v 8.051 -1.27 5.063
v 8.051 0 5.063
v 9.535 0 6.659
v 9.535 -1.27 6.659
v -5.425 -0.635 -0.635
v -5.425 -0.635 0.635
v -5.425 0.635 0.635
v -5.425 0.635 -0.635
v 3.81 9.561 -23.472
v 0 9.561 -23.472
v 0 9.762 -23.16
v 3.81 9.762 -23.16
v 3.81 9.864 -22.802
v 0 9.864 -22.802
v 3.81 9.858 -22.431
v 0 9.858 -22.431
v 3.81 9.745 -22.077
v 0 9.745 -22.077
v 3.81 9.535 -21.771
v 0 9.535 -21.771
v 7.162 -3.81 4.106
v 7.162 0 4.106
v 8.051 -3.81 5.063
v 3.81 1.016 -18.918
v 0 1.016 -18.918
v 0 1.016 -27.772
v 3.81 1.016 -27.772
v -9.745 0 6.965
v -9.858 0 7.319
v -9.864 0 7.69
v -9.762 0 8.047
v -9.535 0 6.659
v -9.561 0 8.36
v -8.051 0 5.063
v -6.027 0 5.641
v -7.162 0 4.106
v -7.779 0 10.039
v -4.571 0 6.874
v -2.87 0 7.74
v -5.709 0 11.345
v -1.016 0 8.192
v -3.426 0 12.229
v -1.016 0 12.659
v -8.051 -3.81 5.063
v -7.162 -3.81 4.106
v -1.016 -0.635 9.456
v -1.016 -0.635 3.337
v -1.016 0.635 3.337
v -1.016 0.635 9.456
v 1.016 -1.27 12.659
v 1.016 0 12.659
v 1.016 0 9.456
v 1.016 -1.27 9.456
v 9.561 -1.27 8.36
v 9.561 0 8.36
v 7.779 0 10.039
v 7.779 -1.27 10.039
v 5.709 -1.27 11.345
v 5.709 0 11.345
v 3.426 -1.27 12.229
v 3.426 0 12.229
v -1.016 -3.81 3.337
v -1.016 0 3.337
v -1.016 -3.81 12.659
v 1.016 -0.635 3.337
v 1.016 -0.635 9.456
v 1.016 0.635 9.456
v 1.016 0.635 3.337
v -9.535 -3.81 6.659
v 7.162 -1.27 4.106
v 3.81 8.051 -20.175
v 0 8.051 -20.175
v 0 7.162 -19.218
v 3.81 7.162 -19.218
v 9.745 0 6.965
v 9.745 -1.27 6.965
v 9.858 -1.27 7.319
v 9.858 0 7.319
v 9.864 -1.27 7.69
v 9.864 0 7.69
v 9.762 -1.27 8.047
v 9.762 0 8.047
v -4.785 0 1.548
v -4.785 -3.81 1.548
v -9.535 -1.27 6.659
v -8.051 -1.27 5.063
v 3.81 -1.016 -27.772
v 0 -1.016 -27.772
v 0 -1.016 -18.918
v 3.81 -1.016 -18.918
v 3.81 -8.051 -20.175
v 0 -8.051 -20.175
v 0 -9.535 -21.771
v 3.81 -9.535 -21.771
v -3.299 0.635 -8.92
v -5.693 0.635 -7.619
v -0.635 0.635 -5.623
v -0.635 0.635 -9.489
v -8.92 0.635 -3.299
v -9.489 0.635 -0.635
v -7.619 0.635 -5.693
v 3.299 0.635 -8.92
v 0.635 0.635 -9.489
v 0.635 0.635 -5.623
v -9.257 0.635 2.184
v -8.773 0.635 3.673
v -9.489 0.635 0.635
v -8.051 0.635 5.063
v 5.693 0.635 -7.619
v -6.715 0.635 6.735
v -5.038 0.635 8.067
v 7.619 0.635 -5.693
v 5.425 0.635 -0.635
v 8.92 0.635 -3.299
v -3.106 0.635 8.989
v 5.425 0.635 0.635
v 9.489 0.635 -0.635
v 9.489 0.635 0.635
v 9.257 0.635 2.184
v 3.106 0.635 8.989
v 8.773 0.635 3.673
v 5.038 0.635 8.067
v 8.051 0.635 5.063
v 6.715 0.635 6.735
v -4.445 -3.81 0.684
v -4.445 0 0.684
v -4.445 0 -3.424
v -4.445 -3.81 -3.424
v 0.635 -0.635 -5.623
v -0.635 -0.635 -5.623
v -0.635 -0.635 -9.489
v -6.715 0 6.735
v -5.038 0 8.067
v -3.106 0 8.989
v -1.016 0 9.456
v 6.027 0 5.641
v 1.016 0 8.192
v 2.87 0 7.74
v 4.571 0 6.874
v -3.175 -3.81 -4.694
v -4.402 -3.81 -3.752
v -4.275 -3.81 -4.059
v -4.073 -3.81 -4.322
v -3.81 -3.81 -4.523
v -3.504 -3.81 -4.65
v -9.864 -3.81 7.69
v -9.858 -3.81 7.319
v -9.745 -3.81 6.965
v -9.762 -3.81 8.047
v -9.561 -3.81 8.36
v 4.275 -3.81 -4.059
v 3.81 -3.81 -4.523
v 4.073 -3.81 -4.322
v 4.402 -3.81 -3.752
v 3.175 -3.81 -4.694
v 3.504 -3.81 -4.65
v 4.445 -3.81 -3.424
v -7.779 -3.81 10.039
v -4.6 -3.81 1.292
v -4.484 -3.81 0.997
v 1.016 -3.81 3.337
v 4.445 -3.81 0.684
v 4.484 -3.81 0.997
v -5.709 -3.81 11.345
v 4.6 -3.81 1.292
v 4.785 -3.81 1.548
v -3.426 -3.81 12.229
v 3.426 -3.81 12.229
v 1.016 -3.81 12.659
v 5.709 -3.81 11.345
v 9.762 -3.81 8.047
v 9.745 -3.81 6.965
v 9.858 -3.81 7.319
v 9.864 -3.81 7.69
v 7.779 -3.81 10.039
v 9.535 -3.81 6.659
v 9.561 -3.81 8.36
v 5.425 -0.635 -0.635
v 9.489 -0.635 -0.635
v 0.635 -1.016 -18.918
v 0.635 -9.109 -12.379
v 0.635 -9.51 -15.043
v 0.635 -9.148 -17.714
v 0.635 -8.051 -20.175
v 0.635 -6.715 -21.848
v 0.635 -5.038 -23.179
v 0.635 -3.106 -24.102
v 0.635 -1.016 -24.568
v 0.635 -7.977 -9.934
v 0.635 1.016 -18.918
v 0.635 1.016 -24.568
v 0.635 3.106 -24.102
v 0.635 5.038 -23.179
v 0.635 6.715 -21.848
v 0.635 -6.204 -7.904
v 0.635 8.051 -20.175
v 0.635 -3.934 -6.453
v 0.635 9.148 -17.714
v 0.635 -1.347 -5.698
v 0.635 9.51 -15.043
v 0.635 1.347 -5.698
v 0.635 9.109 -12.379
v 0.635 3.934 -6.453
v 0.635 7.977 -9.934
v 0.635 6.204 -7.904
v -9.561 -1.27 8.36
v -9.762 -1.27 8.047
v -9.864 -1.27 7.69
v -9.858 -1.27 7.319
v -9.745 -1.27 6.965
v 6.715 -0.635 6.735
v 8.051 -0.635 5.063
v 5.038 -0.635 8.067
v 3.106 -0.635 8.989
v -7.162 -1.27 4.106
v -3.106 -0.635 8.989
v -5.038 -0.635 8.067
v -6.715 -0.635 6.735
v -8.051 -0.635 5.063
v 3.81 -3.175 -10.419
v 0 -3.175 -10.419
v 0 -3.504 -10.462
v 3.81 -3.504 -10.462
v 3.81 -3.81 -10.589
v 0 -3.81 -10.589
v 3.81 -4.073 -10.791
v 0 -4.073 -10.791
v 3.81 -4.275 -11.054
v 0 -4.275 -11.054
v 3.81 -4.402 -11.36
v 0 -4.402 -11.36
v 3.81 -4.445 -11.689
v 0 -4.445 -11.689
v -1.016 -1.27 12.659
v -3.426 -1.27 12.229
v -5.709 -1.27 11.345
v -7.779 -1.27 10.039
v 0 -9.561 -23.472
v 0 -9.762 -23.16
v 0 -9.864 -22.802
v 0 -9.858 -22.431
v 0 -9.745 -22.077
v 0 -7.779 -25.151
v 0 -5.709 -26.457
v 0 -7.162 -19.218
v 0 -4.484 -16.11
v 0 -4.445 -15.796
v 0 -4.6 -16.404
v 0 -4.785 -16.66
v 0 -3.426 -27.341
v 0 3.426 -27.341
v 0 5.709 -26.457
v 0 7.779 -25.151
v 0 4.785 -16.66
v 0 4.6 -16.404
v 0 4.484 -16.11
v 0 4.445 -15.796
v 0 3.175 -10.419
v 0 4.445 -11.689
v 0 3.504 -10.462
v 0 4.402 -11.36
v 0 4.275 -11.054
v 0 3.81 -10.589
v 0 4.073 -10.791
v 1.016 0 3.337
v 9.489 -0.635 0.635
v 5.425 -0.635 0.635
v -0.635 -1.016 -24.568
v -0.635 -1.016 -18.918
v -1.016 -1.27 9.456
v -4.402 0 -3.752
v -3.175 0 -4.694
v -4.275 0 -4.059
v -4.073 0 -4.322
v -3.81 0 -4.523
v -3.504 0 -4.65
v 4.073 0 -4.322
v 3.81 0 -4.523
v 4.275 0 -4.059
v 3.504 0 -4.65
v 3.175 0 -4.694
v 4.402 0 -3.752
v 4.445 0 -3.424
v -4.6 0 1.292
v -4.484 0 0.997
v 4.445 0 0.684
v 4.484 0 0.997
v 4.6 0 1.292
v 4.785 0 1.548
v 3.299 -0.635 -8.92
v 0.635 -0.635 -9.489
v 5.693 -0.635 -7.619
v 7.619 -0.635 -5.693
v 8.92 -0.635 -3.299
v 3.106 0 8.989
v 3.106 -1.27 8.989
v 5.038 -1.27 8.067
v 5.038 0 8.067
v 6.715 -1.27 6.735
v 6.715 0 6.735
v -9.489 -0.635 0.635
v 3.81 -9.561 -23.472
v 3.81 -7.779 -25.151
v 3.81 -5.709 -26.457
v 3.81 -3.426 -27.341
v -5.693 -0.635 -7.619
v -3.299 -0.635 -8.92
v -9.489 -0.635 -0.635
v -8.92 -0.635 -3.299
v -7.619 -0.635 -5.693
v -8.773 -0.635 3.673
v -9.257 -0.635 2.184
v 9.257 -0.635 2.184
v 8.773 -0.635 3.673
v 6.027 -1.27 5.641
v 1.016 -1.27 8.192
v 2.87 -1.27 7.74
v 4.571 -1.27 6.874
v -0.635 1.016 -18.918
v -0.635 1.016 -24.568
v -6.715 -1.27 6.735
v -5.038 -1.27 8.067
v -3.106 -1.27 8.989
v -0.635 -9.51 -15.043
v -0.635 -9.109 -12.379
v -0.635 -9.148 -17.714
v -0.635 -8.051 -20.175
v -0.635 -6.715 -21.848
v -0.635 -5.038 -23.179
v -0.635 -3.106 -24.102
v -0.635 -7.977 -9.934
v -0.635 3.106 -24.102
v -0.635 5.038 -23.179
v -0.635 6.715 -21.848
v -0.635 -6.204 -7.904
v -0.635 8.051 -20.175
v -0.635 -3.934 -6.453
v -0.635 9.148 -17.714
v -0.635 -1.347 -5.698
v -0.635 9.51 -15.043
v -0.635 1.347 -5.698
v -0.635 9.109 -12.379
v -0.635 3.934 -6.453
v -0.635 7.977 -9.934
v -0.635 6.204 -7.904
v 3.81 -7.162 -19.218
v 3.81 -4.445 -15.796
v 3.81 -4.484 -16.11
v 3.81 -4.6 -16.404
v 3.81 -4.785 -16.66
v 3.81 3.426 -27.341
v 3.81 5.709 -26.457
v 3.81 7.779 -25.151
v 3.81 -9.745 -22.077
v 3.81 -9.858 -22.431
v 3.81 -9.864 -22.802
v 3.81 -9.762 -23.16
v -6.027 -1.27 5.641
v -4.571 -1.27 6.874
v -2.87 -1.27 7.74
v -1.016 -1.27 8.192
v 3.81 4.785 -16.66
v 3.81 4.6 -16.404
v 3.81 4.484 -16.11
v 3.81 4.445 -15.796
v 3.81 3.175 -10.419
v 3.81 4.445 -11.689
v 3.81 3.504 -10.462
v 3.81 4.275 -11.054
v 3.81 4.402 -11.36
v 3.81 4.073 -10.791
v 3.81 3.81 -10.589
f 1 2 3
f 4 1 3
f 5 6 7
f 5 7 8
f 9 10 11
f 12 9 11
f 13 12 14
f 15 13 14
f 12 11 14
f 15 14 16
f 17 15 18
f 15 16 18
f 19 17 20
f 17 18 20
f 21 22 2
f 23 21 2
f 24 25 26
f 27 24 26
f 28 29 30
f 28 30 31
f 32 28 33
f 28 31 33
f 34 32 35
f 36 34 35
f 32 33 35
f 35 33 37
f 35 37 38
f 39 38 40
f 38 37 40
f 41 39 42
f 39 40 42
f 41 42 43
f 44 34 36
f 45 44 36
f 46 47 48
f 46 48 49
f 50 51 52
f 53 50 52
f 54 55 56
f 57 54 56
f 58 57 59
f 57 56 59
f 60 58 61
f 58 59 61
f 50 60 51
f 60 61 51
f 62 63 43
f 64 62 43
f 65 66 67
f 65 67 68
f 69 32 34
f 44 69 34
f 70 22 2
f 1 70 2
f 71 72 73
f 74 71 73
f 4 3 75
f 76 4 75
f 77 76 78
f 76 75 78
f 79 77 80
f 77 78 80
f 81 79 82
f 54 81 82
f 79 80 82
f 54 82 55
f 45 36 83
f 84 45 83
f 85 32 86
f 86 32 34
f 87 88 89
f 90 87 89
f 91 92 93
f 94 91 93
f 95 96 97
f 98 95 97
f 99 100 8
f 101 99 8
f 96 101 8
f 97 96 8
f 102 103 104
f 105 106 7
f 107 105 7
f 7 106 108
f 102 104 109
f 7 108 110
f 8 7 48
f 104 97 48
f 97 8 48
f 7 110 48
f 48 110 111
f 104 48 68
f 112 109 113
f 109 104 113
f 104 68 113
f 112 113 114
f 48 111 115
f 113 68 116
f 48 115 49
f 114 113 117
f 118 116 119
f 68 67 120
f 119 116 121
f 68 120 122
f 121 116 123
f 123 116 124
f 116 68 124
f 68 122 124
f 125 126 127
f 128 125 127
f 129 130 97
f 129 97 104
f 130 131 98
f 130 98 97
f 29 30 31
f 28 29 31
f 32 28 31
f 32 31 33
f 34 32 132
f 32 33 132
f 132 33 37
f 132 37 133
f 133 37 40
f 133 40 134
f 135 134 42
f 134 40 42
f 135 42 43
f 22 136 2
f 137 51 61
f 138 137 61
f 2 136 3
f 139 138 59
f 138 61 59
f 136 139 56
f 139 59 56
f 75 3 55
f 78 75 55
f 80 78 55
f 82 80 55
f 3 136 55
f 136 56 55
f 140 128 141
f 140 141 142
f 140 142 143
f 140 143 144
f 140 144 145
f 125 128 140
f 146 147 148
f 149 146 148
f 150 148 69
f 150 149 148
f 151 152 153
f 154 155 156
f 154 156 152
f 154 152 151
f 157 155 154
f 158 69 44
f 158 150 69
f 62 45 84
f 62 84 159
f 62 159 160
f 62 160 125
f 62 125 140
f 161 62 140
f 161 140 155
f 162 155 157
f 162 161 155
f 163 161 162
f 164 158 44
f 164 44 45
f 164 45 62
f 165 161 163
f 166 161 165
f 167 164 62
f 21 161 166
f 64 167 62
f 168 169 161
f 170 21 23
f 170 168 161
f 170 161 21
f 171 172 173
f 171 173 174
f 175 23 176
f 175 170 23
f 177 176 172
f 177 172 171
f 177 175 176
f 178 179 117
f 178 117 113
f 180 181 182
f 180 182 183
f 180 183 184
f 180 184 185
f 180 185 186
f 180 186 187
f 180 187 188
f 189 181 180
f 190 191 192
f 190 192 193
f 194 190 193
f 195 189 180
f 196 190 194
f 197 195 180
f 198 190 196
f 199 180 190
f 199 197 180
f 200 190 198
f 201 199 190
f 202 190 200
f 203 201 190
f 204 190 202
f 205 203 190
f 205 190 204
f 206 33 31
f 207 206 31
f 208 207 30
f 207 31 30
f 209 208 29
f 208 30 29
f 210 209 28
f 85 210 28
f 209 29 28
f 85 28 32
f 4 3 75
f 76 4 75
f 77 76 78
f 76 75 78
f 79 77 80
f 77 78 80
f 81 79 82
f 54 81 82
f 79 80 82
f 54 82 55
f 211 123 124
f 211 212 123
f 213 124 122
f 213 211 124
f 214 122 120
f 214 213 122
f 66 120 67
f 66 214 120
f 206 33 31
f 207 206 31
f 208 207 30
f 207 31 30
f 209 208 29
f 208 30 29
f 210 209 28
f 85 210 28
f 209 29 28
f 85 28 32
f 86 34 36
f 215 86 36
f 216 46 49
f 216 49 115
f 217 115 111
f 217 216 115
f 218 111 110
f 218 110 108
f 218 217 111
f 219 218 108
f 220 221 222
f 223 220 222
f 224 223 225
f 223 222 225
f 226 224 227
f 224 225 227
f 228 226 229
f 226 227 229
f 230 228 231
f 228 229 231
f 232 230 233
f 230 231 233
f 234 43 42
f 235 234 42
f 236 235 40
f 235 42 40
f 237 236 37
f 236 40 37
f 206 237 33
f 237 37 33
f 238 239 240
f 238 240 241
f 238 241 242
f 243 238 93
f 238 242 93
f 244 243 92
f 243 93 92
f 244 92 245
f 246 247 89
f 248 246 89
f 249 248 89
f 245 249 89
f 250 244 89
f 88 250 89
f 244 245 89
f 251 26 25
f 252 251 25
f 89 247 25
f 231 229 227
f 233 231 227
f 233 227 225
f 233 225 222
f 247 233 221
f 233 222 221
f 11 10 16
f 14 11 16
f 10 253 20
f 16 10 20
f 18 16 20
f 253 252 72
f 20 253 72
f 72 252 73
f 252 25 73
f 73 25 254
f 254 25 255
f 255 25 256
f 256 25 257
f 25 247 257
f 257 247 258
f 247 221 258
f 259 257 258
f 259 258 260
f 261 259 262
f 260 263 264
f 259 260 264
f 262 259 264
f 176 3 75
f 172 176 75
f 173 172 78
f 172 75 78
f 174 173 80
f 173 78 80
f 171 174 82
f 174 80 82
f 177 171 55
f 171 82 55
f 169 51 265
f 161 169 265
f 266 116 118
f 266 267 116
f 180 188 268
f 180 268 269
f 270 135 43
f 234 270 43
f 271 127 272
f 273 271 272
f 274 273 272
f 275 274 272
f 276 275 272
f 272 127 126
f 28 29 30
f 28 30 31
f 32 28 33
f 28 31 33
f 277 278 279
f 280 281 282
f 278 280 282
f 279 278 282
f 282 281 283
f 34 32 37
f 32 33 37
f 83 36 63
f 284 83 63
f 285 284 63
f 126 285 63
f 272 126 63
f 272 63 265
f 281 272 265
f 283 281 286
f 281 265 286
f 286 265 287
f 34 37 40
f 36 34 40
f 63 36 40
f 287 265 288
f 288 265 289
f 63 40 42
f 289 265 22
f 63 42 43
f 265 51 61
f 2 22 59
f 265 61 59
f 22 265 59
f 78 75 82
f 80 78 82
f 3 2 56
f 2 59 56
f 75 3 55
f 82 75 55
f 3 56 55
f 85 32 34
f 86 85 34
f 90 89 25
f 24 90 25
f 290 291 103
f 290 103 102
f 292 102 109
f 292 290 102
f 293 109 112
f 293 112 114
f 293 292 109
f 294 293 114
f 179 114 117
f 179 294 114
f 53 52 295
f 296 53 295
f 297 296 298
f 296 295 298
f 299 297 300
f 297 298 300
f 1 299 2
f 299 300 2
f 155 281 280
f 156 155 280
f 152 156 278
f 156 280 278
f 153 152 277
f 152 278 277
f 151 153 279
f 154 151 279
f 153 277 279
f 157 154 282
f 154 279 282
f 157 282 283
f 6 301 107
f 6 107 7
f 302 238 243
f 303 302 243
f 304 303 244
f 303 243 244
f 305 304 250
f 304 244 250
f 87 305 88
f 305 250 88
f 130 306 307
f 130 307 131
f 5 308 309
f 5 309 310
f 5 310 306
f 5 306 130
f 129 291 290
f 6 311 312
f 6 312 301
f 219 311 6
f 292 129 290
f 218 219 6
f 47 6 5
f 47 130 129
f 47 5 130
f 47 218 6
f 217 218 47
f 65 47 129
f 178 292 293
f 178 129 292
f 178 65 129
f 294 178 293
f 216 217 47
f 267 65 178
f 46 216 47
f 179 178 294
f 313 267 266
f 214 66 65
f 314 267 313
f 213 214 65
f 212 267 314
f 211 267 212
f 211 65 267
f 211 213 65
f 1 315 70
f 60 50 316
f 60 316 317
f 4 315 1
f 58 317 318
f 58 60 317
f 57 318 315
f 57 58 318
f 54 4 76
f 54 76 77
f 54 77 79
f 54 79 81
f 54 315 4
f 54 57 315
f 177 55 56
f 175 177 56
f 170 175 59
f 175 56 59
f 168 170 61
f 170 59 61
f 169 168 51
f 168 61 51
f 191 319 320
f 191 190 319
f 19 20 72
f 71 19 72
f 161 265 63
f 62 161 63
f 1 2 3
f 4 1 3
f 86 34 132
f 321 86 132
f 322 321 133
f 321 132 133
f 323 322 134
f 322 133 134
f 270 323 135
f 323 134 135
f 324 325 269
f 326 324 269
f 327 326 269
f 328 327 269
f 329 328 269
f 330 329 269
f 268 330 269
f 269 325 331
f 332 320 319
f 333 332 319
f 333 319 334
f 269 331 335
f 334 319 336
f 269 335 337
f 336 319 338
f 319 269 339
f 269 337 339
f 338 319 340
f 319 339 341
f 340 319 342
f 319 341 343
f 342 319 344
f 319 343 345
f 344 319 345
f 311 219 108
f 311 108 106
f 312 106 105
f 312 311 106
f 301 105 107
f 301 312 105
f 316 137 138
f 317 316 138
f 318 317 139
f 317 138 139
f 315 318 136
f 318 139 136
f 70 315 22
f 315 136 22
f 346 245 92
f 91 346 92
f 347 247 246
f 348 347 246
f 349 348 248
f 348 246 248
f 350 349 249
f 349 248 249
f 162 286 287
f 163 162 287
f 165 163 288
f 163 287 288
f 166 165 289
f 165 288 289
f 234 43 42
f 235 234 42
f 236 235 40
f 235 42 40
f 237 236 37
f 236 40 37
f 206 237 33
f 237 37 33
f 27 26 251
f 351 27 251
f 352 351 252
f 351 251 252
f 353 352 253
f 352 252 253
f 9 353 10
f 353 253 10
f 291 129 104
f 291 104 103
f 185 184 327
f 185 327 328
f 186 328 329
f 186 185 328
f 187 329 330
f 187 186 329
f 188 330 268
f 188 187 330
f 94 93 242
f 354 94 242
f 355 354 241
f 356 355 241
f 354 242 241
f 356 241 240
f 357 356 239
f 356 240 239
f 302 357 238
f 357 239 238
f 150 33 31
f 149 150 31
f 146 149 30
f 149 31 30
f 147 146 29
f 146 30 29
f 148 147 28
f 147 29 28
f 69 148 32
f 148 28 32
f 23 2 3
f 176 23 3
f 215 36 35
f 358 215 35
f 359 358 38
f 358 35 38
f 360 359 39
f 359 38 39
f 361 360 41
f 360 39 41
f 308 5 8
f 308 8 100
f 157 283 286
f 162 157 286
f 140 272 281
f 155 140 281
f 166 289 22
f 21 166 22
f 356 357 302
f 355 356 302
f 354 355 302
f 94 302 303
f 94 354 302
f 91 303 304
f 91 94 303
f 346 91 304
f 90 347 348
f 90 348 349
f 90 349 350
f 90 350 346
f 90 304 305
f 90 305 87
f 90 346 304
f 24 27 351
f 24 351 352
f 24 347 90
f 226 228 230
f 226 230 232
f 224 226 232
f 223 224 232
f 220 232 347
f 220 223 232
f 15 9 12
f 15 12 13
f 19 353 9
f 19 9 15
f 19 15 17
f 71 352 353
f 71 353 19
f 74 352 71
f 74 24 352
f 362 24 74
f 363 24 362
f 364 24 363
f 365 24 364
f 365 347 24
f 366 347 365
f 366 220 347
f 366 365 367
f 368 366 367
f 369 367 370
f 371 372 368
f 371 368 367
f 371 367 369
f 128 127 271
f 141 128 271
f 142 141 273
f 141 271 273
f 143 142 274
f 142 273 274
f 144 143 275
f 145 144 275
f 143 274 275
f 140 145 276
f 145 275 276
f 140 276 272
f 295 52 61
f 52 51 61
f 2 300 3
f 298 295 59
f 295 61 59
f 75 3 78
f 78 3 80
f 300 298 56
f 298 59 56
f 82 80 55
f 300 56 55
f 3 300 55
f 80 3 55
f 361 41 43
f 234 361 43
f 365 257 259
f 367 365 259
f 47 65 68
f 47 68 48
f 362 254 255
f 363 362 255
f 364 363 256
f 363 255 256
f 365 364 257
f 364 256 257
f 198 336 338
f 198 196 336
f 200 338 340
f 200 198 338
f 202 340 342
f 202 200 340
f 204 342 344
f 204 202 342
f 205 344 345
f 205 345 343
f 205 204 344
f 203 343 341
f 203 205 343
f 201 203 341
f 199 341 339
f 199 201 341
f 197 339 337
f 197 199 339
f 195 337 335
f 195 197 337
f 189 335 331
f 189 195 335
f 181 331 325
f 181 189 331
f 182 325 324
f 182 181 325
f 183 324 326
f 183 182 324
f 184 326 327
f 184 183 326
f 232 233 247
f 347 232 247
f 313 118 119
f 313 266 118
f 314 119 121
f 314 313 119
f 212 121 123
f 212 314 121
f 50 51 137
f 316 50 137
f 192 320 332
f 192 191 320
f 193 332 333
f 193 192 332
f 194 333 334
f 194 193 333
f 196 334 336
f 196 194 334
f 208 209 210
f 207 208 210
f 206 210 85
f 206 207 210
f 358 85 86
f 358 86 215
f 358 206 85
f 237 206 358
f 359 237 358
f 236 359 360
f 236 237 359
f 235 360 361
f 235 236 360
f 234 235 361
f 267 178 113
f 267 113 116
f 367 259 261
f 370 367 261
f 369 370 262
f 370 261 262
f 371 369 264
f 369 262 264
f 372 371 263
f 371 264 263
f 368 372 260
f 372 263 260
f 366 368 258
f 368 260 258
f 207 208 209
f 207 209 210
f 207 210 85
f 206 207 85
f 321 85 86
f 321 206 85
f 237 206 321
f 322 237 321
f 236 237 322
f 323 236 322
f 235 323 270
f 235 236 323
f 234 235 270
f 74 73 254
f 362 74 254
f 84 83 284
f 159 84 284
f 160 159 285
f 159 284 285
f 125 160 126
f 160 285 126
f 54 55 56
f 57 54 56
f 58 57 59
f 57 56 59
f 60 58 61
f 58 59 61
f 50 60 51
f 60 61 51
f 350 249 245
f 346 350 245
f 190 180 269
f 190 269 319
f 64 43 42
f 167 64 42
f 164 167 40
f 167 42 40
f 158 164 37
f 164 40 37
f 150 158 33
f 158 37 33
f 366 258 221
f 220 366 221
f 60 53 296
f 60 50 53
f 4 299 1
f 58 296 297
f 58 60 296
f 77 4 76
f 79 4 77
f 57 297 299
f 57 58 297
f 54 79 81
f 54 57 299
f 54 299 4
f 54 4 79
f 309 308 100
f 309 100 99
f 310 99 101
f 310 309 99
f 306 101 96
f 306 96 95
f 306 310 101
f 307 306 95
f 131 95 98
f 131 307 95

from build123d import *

# Parameters (mm, degrees)
F1_DEPTH = 3.81
F2_DEPTH = 3.175
F3_DEPTH = 1.27
F5_DEPTH = 1.27
F6_DEPTH = 0.635
F8_DEPTH = 3.81
F9_DEPTH = 0.635


with BuildPart() as f1:
    # F0 (on Front) → F1 (new body)
    with BuildSketch(Plane.XZ):
        with BuildLine():
            ThreePointArc((-1.016, 8.192238), (-4.570978, 6.87395), (-7.161671, 4.105544))
            Line((-7.161671, 4.105544), (-4.784743, 1.548093))
            ThreePointArc((-4.784743, 1.548093), (-4.532983, 1.147974), (-4.445, 0.6835))
            Line((-4.445, 0.6835), (-4.445, -3.42361))
            ThreePointArc((-4.445, -3.42361), (-4.073026, -4.321636), (-3.175, -4.69361))
            Line((-3.175, -4.69361), (3.175, -4.69361))
            ThreePointArc((3.175, -4.69361), (4.073026, -4.321636), (4.445, -3.42361))
            Line((4.445, -3.42361), (4.445, 0.6835))
            ThreePointArc((4.445, 0.6835), (4.532983, 1.147974), (4.784743, 1.548093))
            Line((4.784743, 1.548093), (7.161671, 4.105544))
            ThreePointArc((7.161671, 4.105544), (4.570978, 6.87395), (1.016, 8.192238))
            Line((1.016, 8.192238), (1.016, 3.336906))
            Line((1.016, 3.336906), (-1.016, 3.336906))
            Line((-1.016, 3.336906), (-1.016, 8.192238))
        make_face()
        with BuildLine():
            Line((7.161671, 4.105544), (8.051177, 5.062607))
            ThreePointArc((8.051177, 5.062607), (5.037785, 8.066731), (1.016, 9.456171))
            Line((1.016, 9.456171), (1.016, 8.192238))
            ThreePointArc((1.016, 8.192238), (4.570978, 6.87395), (7.161671, 4.105544))
        make_face()
        with BuildLine():
            ThreePointArc((1.016, 9.456171), (5.037785, 8.066731), (8.051177, 5.062607))
            Line((8.051177, 5.062607), (9.53491, 6.659027))
            ThreePointArc((9.53491, 6.659027), (9.874506, 7.504343), (9.560725, 8.359577))
            ThreePointArc((9.560725, 8.359577), (5.708649, 11.344661), (1.016, 12.659295))
            Line((1.016, 12.659295), (1.016, 9.456171))
        make_face()
        with BuildLine():
            ThreePointArc((-1.016, 9.456171), (-5.037785, 8.066731), (-8.051177, 5.062607))
            Line((-8.051177, 5.062607), (-7.161671, 4.105544))
            ThreePointArc((-7.161671, 4.105544), (-4.570978, 6.87395), (-1.016, 8.192238))
            Line((-1.016, 8.192238), (-1.016, 9.456171))
        make_face()
        with BuildLine():
            Line((-9.53491, 6.659027), (-8.051177, 5.062607))
            ThreePointArc((-8.051177, 5.062607), (-5.037785, 8.066731), (-1.016, 9.456171))
            Line((-1.016, 9.456171), (-1.016, 12.659295))
            ThreePointArc((-1.016, 12.659295), (-5.708649, 11.344661), (-9.560725, 8.359577))
            ThreePointArc((-9.560725, 8.359577), (-9.874506, 7.504343), (-9.53491, 6.659027))
        make_face()
    extrude(amount=F1_DEPTH)


with BuildPart() as f2:
    # F0 (on Front) → F2 (new body)
    with BuildSketch(Plane.XZ):
        with BuildLine():
            Line((-9.53491, 6.659027), (-8.051177, 5.062607))
            ThreePointArc((-8.051177, 5.062607), (-5.037785, 8.066731), (-1.016, 9.456171))
            Line((-1.016, 9.456171), (-1.016, 12.659295))
            ThreePointArc((-1.016, 12.659295), (-5.708649, 11.344661), (-9.560725, 8.359577))
            ThreePointArc((-9.560725, 8.359577), (-9.874506, 7.504343), (-9.53491, 6.659027))
        make_face()
        with BuildLine():
            ThreePointArc((-1.016, 9.456171), (-5.037785, 8.066731), (-8.051177, 5.062607))
            Line((-8.051177, 5.062607), (-7.161671, 4.105544))
            ThreePointArc((-7.161671, 4.105544), (-4.570978, 6.87395), (-1.016, 8.192238))
            Line((-1.016, 8.192238), (-1.016, 9.456171))
        make_face()
        with BuildLine():
            ThreePointArc((1.016, 9.456171), (5.037785, 8.066731), (8.051177, 5.062607))
            Line((8.051177, 5.062607), (9.53491, 6.659027))
            ThreePointArc((9.53491, 6.659027), (9.874506, 7.504343), (9.560725, 8.359577))
            ThreePointArc((9.560725, 8.359577), (5.708649, 11.344661), (1.016, 12.659295))
            Line((1.016, 12.659295), (1.016, 9.456171))
        make_face()
        with BuildLine():
            Line((7.161671, 4.105544), (8.051177, 5.062607))
            ThreePointArc((8.051177, 5.062607), (5.037785, 8.066731), (1.016, 9.456171))
            Line((1.016, 9.456171), (1.016, 8.192238))
            ThreePointArc((1.016, 8.192238), (4.570978, 6.87395), (7.161671, 4.105544))
        make_face()
    extrude(amount=F2_DEPTH)


with BuildPart() as f3:
    # F0 (on Front) → F3 (new body)
    with BuildSketch(Plane.XZ):
        with BuildLine():
            ThreePointArc((1.016, 9.456171), (5.037785, 8.066731), (8.051177, 5.062607))
            Line((8.051177, 5.062607), (9.53491, 6.659027))
            ThreePointArc((9.53491, 6.659027), (9.874506, 7.504343), (9.560725, 8.359577))
            ThreePointArc((9.560725, 8.359577), (5.708649, 11.344661), (1.016, 12.659295))
            Line((1.016, 12.659295), (1.016, 9.456171))
        make_face()
        with BuildLine():
            Line((-9.53491, 6.659027), (-8.051177, 5.062607))
            ThreePointArc((-8.051177, 5.062607), (-5.037785, 8.066731), (-1.016, 9.456171))
            Line((-1.016, 9.456171), (-1.016, 12.659295))
            ThreePointArc((-1.016, 12.659295), (-5.708649, 11.344661), (-9.560725, 8.359577))
            ThreePointArc((-9.560725, 8.359577), (-9.874506, 7.504343), (-9.53491, 6.659027))
        make_face()
    extrude(amount=F3_DEPTH)


with BuildPart() as f5:
    # F0 (on Front) → F5 (new body)
    with BuildSketch(Plane.XZ):
        with BuildLine():
            Line((-9.53491, 6.659027), (-8.051177, 5.062607))
            ThreePointArc((-8.051177, 5.062607), (-5.037785, 8.066731), (-1.016, 9.456171))
            Line((-1.016, 9.456171), (-1.016, 12.659295))
            ThreePointArc((-1.016, 12.659295), (-5.708649, 11.344661), (-9.560725, 8.359577))
            ThreePointArc((-9.560725, 8.359577), (-9.874506, 7.504343), (-9.53491, 6.659027))
        make_face()
        with BuildLine():
            ThreePointArc((-1.016, 9.456171), (-5.037785, 8.066731), (-8.051177, 5.062607))
            Line((-8.051177, 5.062607), (-7.161671, 4.105544))
            ThreePointArc((-7.161671, 4.105544), (-4.570978, 6.87395), (-1.016, 8.192238))
            Line((-1.016, 8.192238), (-1.016, 9.456171))
        make_face()
        with BuildLine():
            Line((7.161671, 4.105544), (8.051177, 5.062607))
            ThreePointArc((8.051177, 5.062607), (5.037785, 8.066731), (1.016, 9.456171))
            Line((1.016, 9.456171), (1.016, 8.192238))
            ThreePointArc((1.016, 8.192238), (4.570978, 6.87395), (7.161671, 4.105544))
        make_face()
        with BuildLine():
            ThreePointArc((1.016, 9.456171), (5.037785, 8.066731), (8.051177, 5.062607))
            Line((8.051177, 5.062607), (9.53491, 6.659027))
            ThreePointArc((9.53491, 6.659027), (9.874506, 7.504343), (9.560725, 8.359577))
            ThreePointArc((9.560725, 8.359577), (5.708649, 11.344661), (1.016, 12.659295))
            Line((1.016, 12.659295), (1.016, 9.456171))
        make_face()
    extrude(amount=F5_DEPTH)


with BuildPart() as f6:
    # F0 (on Front) → F6 (new body, symmetric)
    with BuildSketch(Plane.XZ):
        with BuildLine():
            Line((7.161671, 4.105544), (8.051177, 5.062607))
            ThreePointArc((8.051177, 5.062607), (5.037785, 8.066731), (1.016, 9.456171))
            Line((1.016, 9.456171), (1.016, 8.192238))
            ThreePointArc((1.016, 8.192238), (4.570978, 6.87395), (7.161671, 4.105544))
        make_face()
        with BuildLine():
            ThreePointArc((-1.016, 9.456171), (-5.037785, 8.066731), (-8.051177, 5.062607))
            Line((-8.051177, 5.062607), (-7.161671, 4.105544))
            ThreePointArc((-7.161671, 4.105544), (-4.570978, 6.87395), (-1.016, 8.192238))
            Line((-1.016, 8.192238), (-1.016, 9.456171))
        make_face()
        with BuildLine():
            ThreePointArc((-1.016, 8.192238), (-4.570978, 6.87395), (-7.161671, 4.105544))
            Line((-7.161671, 4.105544), (-4.784743, 1.548093))
            ThreePointArc((-4.784743, 1.548093), (-4.532983, 1.147974), (-4.445, 0.6835))
            Line((-4.445, 0.6835), (-4.445, -3.42361))
            ThreePointArc((-4.445, -3.42361), (-4.073026, -4.321636), (-3.175, -4.69361))
            Line((-3.175, -4.69361), (3.175, -4.69361))
            ThreePointArc((3.175, -4.69361), (4.073026, -4.321636), (4.445, -3.42361))
            Line((4.445, -3.42361), (4.445, 0.6835))
            ThreePointArc((4.445, 0.6835), (4.532983, 1.147974), (4.784743, 1.548093))
            Line((4.784743, 1.548093), (7.161671, 4.105544))
            ThreePointArc((7.161671, 4.105544), (4.570978, 6.87395), (1.016, 8.192238))
            Line((1.016, 8.192238), (1.016, 3.336906))
            Line((1.016, 3.336906), (-1.016, 3.336906))
            Line((-1.016, 3.336906), (-1.016, 8.192238))
        make_face()
        with BuildLine():
            ThreePointArc((-8.051177, 5.062607), (-9.045366, 2.93816), (-9.489373, 0.635))
            Line((-9.489373, 0.635), (-5.425373, 0.635))
            Line((-5.425373, 0.635), (-5.425373, -0.635))
            Line((-5.425373, -0.635), (-9.489373, -0.635))
            ThreePointArc((-9.489373, -0.635), (-6.725007, -6.725007), (-0.635, -9.489373))
            Line((-0.635, -9.489373), (-0.635, -8.230541))
            Line((-0.635, -8.230541), (-0.635, -5.622906))
            Line((-0.635, -5.622906), (0.635, -5.622906))
            Line((0.635, -5.622906), (0.635, -8.230541))
            Line((0.635, -8.230541), (0.635, -9.489373))
            ThreePointArc((0.635, -9.489373), (6.725007, -6.725007), (9.489373, -0.635))
            Line((9.489373, -0.635), (5.425373, -0.635))
            Line((5.425373, -0.635), (5.425373, 0.635))
            Line((5.425373, 0.635), (9.489373, 0.635))
            ThreePointArc((9.489373, 0.635), (9.045366, 2.93816), (8.051177, 5.062607))
            Line((8.051177, 5.062607), (7.161671, 4.105544))
            Line((7.161671, 4.105544), (4.784743, 1.548093))
            ThreePointArc((4.784743, 1.548093), (4.532983, 1.147974), (4.445, 0.6835))
            Line((4.445, 0.6835), (4.445, -3.42361))
            ThreePointArc((4.445, -3.42361), (4.073026, -4.321636), (3.175, -4.69361))
            Line((3.175, -4.69361), (-3.175, -4.69361))
            ThreePointArc((-3.175, -4.69361), (-4.073026, -4.321636), (-4.445, -3.42361))
            Line((-4.445, -3.42361), (-4.445, 0.6835))
            ThreePointArc((-4.445, 0.6835), (-4.532983, 1.147974), (-4.784743, 1.548093))
            Line((-4.784743, 1.548093), (-7.161671, 4.105544))
            Line((-7.161671, 4.105544), (-8.051177, 5.062607))
        make_face()
    extrude(amount=F6_DEPTH, both=True)


with BuildPart() as f8:
    # F7 (on Right) → F8 (new body)
    with BuildSketch(Plane.YZ):
        with BuildLine():
            Line((1.016, -18.917798), (1.016, -23.304518))
            ThreePointArc((1.016, -23.304518), (4.570978, -21.986229), (7.161671, -19.217824))
            Line((7.161671, -19.217824), (4.784743, -16.660372))
            ThreePointArc((4.784743, -16.660372), (4.532983, -16.260254), (4.445, -15.795779))
            Line((4.445, -15.795779), (4.445, -11.68867))
            ThreePointArc((4.445, -11.68867), (4.073026, -10.790644), (3.175, -10.41867))
            Line((3.175, -10.41867), (-3.175, -10.41867))
            ThreePointArc((-3.175, -10.41867), (-4.073026, -10.790644), (-4.445, -11.68867))
            Line((-4.445, -11.68867), (-4.445, -15.795779))
            ThreePointArc((-4.445, -15.795779), (-4.532983, -16.260254), (-4.784743, -16.660372))
            Line((-4.784743, -16.660372), (-7.161671, -19.217824))
            ThreePointArc((-7.161671, -19.217824), (-4.570978, -21.986229), (-1.016, -23.304518))
            Line((-1.016, -23.304518), (-1.016, -18.917798))
            Line((-1.016, -18.917798), (1.016, -18.917798))
        make_face()
        with BuildLine():
            Line((1.016, -23.304518), (1.016, -24.568451))
            ThreePointArc((1.016, -24.568451), (5.037785, -23.179011), (8.051177, -20.174886))
            Line((8.051177, -20.174886), (7.161671, -19.217824))
            ThreePointArc((7.161671, -19.217824), (4.570978, -21.986229), (1.016, -23.304518))
        make_face()
        with BuildLine():
            ThreePointArc((8.051177, -20.174886), (5.037785, -23.179011), (1.016, -24.568451))
            Line((1.016, -24.568451), (1.016, -27.771574))
            ThreePointArc((1.016, -27.771574), (5.708649, -26.456941), (9.560725, -23.471857))
            ThreePointArc((9.560725, -23.471857), (9.874506, -22.616622), (9.53491, -21.771306))
            Line((9.53491, -21.771306), (8.051177, -20.174886))
        make_face()
        with BuildLine():
            Line((-7.161671, -19.217824), (-8.051177, -20.174886))
            ThreePointArc((-8.051177, -20.174886), (-5.037785, -23.179011), (-1.016, -24.568451))
            Line((-1.016, -24.568451), (-1.016, -23.304518))
            ThreePointArc((-1.016, -23.304518), (-4.570978, -21.986229), (-7.161671, -19.217824))
        make_face()
        with BuildLine():
            ThreePointArc((-1.016, -24.568451), (-5.037785, -23.179011), (-8.051177, -20.174886))
            Line((-8.051177, -20.174886), (-9.53491, -21.771306))
            ThreePointArc((-9.53491, -21.771306), (-9.874506, -22.616622), (-9.560725, -23.471857))
            ThreePointArc((-9.560725, -23.471857), (-5.708649, -26.456941), (-1.016, -27.771574))
            Line((-1.016, -27.771574), (-1.016, -24.568451))
        make_face()
    extrude(amount=F8_DEPTH)


with BuildPart() as f9:
    # F7 (on Right) → F9 (new body, symmetric)
    with BuildSketch(Plane.YZ):
        with BuildLine():
            Line((7.161671, -19.217824), (8.051177, -20.174886))
            ThreePointArc((8.051177, -20.174886), (0, -5.601684), (-8.051177, -20.174886))
            Line((-8.051177, -20.174886), (-7.161671, -19.217824))
            Line((-7.161671, -19.217824), (-4.784743, -16.660372))
            ThreePointArc((-4.784743, -16.660372), (-4.532983, -16.260254), (-4.445, -15.795779))
            Line((-4.445, -15.795779), (-4.445, -11.68867))
            ThreePointArc((-4.445, -11.68867), (-4.073026, -10.790644), (-3.175, -10.41867))
            Line((-3.175, -10.41867), (3.175, -10.41867))
            ThreePointArc((3.175, -10.41867), (4.073026, -10.790644), (4.445, -11.68867))
            Line((4.445, -11.68867), (4.445, -15.795779))
            ThreePointArc((4.445, -15.795779), (4.532983, -16.260254), (4.784743, -16.660372))
            Line((4.784743, -16.660372), (7.161671, -19.217824))
        make_face()
        with BuildLine():
            Line((-7.161671, -19.217824), (-8.051177, -20.174886))
            ThreePointArc((-8.051177, -20.174886), (-5.037785, -23.179011), (-1.016, -24.568451))
            Line((-1.016, -24.568451), (-1.016, -23.304518))
            ThreePointArc((-1.016, -23.304518), (-4.570978, -21.986229), (-7.161671, -19.217824))
        make_face()
        with BuildLine():
            Line((1.016, -18.917798), (1.016, -23.304518))
            ThreePointArc((1.016, -23.304518), (4.570978, -21.986229), (7.161671, -19.217824))
            Line((7.161671, -19.217824), (4.784743, -16.660372))
            ThreePointArc((4.784743, -16.660372), (4.532983, -16.260254), (4.445, -15.795779))
            Line((4.445, -15.795779), (4.445, -11.68867))
            ThreePointArc((4.445, -11.68867), (4.073026, -10.790644), (3.175, -10.41867))
            Line((3.175, -10.41867), (-3.175, -10.41867))
            ThreePointArc((-3.175, -10.41867), (-4.073026, -10.790644), (-4.445, -11.68867))
            Line((-4.445, -11.68867), (-4.445, -15.795779))
            ThreePointArc((-4.445, -15.795779), (-4.532983, -16.260254), (-4.784743, -16.660372))
            Line((-4.784743, -16.660372), (-7.161671, -19.217824))
            ThreePointArc((-7.161671, -19.217824), (-4.570978, -21.986229), (-1.016, -23.304518))
            Line((-1.016, -23.304518), (-1.016, -18.917798))
            Line((-1.016, -18.917798), (1.016, -18.917798))
        make_face()
        with BuildLine():
            Line((1.016, -23.304518), (1.016, -24.568451))
            ThreePointArc((1.016, -24.568451), (5.037785, -23.179011), (8.051177, -20.174886))
            Line((8.051177, -20.174886), (7.161671, -19.217824))
            ThreePointArc((7.161671, -19.217824), (4.570978, -21.986229), (1.016, -23.304518))
        make_face()
    extrude(amount=F9_DEPTH, both=True)


solid = Compound([f1.part, f3.part, f5.part, f6.part, f8.part, f9.part])
